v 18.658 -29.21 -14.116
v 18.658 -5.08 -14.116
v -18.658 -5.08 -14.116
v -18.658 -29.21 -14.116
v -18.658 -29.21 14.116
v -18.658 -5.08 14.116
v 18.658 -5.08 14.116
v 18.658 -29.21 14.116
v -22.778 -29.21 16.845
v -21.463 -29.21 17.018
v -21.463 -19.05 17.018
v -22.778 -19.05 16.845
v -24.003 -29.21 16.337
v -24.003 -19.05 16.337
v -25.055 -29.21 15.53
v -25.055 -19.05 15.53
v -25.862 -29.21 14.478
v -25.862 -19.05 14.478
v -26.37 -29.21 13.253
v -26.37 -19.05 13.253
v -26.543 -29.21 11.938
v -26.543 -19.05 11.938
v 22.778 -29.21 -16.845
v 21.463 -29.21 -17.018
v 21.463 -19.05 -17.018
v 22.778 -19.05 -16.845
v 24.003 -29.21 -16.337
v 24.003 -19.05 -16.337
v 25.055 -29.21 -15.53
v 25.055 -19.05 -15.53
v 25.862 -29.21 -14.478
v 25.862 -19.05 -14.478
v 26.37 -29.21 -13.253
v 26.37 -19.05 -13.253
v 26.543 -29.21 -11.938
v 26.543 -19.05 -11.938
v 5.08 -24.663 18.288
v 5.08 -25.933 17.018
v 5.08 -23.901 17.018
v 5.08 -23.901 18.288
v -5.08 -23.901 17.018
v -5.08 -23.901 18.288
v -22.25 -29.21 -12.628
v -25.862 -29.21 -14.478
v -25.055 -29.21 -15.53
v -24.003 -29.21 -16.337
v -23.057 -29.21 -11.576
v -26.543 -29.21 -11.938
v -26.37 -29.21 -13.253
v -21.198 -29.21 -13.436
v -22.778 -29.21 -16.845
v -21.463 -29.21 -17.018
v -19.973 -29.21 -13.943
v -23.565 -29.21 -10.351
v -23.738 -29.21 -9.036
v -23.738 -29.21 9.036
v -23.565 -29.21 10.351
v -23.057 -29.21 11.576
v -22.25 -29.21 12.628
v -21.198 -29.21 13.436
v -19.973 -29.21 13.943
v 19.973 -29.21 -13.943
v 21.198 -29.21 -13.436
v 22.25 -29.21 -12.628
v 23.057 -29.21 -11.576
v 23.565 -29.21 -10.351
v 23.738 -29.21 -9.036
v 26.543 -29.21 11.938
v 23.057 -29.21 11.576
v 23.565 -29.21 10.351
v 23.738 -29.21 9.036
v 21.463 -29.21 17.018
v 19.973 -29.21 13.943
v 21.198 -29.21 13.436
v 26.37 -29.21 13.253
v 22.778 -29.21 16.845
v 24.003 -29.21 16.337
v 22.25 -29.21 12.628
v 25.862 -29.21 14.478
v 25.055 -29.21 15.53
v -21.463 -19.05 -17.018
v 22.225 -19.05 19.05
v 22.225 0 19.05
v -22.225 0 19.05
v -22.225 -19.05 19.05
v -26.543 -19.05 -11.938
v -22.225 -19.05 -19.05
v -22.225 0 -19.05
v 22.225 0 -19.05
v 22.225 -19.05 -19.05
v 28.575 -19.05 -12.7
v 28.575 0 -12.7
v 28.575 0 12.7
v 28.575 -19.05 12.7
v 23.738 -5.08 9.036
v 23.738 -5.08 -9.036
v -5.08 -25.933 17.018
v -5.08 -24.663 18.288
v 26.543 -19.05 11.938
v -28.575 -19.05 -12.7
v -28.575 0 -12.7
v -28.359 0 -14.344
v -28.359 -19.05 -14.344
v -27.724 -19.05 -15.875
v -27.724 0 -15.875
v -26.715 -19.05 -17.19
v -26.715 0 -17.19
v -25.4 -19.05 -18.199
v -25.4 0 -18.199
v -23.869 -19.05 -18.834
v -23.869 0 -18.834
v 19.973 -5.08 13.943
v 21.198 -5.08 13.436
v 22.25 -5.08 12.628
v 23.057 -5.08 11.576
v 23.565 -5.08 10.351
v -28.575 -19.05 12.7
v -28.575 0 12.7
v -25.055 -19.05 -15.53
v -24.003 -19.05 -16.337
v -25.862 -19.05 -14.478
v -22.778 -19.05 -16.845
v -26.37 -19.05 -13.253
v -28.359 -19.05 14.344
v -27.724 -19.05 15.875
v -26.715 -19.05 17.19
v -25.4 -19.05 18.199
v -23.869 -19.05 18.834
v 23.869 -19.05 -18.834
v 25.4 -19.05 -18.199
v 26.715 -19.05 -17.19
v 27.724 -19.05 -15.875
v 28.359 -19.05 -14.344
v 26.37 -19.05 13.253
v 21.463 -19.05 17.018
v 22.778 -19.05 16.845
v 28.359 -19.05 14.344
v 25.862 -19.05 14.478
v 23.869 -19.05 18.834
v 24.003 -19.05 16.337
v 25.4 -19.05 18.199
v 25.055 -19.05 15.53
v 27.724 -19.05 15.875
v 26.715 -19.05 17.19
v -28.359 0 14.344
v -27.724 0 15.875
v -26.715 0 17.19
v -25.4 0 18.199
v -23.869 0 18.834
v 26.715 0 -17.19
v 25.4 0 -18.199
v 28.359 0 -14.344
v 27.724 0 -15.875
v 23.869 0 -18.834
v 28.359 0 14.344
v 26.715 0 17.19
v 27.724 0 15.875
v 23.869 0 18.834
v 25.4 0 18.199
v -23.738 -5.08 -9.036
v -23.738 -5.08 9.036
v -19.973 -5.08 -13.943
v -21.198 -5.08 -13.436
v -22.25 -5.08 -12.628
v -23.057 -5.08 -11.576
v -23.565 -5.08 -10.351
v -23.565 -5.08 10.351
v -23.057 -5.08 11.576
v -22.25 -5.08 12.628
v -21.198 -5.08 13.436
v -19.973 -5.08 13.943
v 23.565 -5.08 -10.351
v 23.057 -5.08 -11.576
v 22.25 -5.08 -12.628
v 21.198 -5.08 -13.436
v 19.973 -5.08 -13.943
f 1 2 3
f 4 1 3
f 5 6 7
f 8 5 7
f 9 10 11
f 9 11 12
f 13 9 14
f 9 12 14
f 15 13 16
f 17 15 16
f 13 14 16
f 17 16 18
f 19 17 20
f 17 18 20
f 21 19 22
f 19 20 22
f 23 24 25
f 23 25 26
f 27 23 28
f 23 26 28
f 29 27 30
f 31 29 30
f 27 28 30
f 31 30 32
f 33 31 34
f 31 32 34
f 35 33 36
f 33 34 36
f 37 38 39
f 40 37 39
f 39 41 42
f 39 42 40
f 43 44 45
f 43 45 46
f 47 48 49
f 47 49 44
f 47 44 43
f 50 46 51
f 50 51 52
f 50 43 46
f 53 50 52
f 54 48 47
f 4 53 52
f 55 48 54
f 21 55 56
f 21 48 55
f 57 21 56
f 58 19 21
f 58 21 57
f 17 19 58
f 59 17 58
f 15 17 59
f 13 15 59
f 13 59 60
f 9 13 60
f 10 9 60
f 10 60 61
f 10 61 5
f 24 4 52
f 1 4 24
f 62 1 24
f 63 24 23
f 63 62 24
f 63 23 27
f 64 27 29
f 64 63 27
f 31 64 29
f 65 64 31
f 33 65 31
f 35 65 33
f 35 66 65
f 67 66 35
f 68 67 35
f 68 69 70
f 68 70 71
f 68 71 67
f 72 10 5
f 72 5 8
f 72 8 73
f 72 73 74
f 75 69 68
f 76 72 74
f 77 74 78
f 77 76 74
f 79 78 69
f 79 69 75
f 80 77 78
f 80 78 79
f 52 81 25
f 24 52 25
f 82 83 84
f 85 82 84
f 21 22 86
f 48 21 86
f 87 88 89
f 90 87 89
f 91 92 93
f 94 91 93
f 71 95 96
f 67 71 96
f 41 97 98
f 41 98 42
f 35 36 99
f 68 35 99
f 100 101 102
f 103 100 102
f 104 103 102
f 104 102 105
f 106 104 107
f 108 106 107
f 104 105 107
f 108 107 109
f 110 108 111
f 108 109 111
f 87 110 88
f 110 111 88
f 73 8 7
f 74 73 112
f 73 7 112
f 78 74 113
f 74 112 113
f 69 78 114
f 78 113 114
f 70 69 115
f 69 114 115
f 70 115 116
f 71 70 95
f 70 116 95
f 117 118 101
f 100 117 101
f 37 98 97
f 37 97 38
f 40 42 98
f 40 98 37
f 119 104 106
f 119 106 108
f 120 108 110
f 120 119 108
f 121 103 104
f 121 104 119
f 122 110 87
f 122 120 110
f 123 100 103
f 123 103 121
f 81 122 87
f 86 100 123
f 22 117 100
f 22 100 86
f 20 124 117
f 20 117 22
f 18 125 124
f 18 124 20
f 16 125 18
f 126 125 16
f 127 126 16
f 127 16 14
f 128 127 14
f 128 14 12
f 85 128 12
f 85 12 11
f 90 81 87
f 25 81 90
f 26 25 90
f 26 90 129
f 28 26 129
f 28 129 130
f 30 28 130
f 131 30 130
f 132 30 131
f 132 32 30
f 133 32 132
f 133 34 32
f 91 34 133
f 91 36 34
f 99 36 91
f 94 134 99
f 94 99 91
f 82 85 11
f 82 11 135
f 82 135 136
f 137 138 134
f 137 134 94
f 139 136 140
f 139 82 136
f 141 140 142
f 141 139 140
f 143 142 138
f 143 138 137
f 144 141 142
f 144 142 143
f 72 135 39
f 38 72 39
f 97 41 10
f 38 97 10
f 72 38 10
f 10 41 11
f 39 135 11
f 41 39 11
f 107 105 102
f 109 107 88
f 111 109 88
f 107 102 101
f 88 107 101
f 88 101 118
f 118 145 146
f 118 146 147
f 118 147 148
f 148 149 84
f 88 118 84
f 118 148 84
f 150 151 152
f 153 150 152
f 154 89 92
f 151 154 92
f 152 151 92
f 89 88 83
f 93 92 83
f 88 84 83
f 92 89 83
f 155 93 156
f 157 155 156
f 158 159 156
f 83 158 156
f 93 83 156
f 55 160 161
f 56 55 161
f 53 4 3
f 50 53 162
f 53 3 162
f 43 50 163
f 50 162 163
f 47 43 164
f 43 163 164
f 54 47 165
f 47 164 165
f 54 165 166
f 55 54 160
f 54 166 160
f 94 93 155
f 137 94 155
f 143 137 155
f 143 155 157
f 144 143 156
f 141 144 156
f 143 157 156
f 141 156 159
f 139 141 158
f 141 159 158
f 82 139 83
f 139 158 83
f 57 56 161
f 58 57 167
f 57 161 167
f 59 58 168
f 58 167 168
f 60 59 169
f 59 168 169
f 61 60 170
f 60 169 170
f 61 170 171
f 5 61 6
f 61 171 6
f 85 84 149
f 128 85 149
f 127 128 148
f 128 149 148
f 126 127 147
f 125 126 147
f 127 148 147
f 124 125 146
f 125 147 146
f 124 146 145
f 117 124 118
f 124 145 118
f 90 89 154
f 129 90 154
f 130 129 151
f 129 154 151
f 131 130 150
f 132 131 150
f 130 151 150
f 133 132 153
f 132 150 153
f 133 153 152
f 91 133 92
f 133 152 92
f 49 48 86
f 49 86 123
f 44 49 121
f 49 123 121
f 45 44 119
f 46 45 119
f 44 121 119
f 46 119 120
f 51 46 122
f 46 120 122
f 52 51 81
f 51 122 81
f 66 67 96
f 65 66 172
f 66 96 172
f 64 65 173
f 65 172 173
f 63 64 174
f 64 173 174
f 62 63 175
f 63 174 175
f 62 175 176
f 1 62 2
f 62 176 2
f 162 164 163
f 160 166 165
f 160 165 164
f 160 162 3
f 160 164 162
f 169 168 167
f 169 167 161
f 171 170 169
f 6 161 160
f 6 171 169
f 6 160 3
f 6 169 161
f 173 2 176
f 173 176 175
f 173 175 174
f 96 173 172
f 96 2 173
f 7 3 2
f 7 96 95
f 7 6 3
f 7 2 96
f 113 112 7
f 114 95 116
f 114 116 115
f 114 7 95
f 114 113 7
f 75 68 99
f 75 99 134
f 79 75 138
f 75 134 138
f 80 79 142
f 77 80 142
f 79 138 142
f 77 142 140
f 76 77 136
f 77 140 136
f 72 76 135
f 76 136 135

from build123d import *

# Parameters (mm, degrees)
F1_DEPTH = 19.05
F2_DEPTH = 29.21
F3_DEPTH = 5.08
F4_W     = 10.16
F4_H     = 2.032
F5_DEPTH = 1.27
F6_SIZE  = 1.26999


# Not quite as in the source:
# - a fillet or chamfer is up to 0.001 mm smaller than in the source, because OpenCascade refuses the exact size


with BuildPart() as f1:
    # F0 (on Front) → F1 (new body)
    with BuildSketch(Plane.XZ):
        with BuildLine():
            ThreePointArc((28.575, 12.7), (26.7151280605, 17.1901280605), (22.225, 19.05))
            Line((22.225, 19.05), (-22.225, 19.05))
            ThreePointArc((-22.225, 19.05), (-26.7151280605, 17.1901280605), (-28.575, 12.7))
            Line((-28.575, 12.7), (-28.575, -12.7))
            ThreePointArc((-28.575, -12.7), (-26.7151280605, -17.1901280605), (-22.225, -19.05))
            Line((-22.225, -19.05), (22.225, -19.05))
            ThreePointArc((22.225, -19.05), (26.7151280605, -17.1901280605), (28.575, -12.7))
            Line((28.575, -12.7), (28.575, 12.7))
        make_face()
        with BuildLine():
            Line((-21.463, 17.018), (21.463, 17.018))
            ThreePointArc((21.463, 17.018), (25.0551024484, 15.5301024484), (26.543, 11.938))
            Line((26.543, 11.938), (26.543, -11.938))
            ThreePointArc((26.543, -11.938), (25.0551024484, -15.5301024484), (21.463, -17.018))
            Line((21.463, -17.018), (-21.463, -17.018))
            ThreePointArc((-21.463, -17.018), (-25.0551024484, -15.5301024484), (-26.543, -11.938))
            Line((-26.543, -11.938), (-26.543, 11.938))
            ThreePointArc((-26.543, 11.938), (-25.0551024484, 15.5301024484), (-21.463, 17.018))
        make_face(mode=Mode.SUBTRACT)
    extrude(amount=F1_DEPTH)

    # F0 (on Front) → F2 (join)
    with BuildSketch(Plane.XZ):
        with BuildLine():
            ThreePointArc((26.543, 11.938), (25.0551024484, 15.5301024484), (21.463, 17.018))
            Line((21.463, 17.018), (-21.463, 17.018))
            ThreePointArc((-21.463, 17.018), (-25.0551024484, 15.5301024484), (-26.543, 11.938))
            Line((-26.543, 11.938), (-26.543, -11.938))
            ThreePointArc((-26.543, -11.938), (-25.0551024484, -15.5301024484), (-21.463, -17.018))
            Line((-21.463, -17.018), (21.463, -17.018))
            ThreePointArc((21.463, -17.018), (25.0551024484, -15.5301024484), (26.543, -11.938))
            Line((26.543, -11.938), (26.543, 11.938))
        make_face()
        with BuildLine():
            ThreePointArc((-23.7377081066, 9.0361186621), (-22.2498105551, 12.6282211105), (-18.6577081066, 14.1161186621))
            Line((-18.6577081066, 14.1161186621), (18.6577081066, 14.1161186621))
            ThreePointArc((18.6577081066, 14.1161186621), (22.2498105551, 12.6282211105), (23.7377081066, 9.0361186621))
            Line((23.7377081066, 9.0361186621), (23.7377081066, -9.0361186621))
            ThreePointArc((23.7377081066, -9.0361186621), (22.2498105551, -12.6282211105), (18.6577081066, -14.1161186621))
            Line((18.6577081066, -14.1161186621), (-18.6577081066, -14.1161186621))
            ThreePointArc((-18.6577081066, -14.1161186621), (-22.2498105551, -12.6282211105), (-23.7377081066, -9.0361186621))
            Line((-23.7377081066, -9.0361186621), (-23.7377081066, 9.0361186621))
        make_face(mode=Mode.SUBTRACT)
    extrude(amount=F2_DEPTH)

    # F0 (on Front) → F3 (join)
    with BuildSketch(Plane.XZ):
        with BuildLine():
            Line((18.6577081066, 14.1161186621), (-18.6577081066, 14.1161186621))
            ThreePointArc((-18.6577081066, 14.1161186621), (-22.2498105551, 12.6282211105), (-23.7377081066, 9.0361186621))
            Line((-23.7377081066, 9.0361186621), (-23.7377081066, -9.0361186621))
            ThreePointArc((-23.7377081066, -9.0361186621), (-22.2498105551, -12.6282211105), (-18.6577081066, -14.1161186621))
            Line((-18.6577081066, -14.1161186621), (18.6577081066, -14.1161186621))
            ThreePointArc((18.6577081066, -14.1161186621), (22.2498105551, -12.6282211105), (23.7377081066, -9.0361186621))
            Line((23.7377081066, -9.0361186621), (23.7377081066, 9.0361186621))
            ThreePointArc((23.7377081066, 9.0361186621), (22.2498105551, 12.6282211105), (18.6577081066, 14.1161186621))
        make_face()
    extrude(amount=F3_DEPTH)

    # F4 (on face) → F5 (join)
    with BuildSketch(Plane.XY.offset(17.018)):
        with Locations((0, -24.9174)):
            Rectangle(F4_W, F4_H)
    extrude(amount=F5_DEPTH)

    # F6 (size 1.27 in the source; OpenCascade refuses exactly that, so slightly less here)
    f6_edges = [f1.edges().sort_by_distance(p)[0] for p in [
        (0, -25.9334, 18.288),
    ]]
    chamfer(f6_edges, length=F6_SIZE)


solid = f1.part
